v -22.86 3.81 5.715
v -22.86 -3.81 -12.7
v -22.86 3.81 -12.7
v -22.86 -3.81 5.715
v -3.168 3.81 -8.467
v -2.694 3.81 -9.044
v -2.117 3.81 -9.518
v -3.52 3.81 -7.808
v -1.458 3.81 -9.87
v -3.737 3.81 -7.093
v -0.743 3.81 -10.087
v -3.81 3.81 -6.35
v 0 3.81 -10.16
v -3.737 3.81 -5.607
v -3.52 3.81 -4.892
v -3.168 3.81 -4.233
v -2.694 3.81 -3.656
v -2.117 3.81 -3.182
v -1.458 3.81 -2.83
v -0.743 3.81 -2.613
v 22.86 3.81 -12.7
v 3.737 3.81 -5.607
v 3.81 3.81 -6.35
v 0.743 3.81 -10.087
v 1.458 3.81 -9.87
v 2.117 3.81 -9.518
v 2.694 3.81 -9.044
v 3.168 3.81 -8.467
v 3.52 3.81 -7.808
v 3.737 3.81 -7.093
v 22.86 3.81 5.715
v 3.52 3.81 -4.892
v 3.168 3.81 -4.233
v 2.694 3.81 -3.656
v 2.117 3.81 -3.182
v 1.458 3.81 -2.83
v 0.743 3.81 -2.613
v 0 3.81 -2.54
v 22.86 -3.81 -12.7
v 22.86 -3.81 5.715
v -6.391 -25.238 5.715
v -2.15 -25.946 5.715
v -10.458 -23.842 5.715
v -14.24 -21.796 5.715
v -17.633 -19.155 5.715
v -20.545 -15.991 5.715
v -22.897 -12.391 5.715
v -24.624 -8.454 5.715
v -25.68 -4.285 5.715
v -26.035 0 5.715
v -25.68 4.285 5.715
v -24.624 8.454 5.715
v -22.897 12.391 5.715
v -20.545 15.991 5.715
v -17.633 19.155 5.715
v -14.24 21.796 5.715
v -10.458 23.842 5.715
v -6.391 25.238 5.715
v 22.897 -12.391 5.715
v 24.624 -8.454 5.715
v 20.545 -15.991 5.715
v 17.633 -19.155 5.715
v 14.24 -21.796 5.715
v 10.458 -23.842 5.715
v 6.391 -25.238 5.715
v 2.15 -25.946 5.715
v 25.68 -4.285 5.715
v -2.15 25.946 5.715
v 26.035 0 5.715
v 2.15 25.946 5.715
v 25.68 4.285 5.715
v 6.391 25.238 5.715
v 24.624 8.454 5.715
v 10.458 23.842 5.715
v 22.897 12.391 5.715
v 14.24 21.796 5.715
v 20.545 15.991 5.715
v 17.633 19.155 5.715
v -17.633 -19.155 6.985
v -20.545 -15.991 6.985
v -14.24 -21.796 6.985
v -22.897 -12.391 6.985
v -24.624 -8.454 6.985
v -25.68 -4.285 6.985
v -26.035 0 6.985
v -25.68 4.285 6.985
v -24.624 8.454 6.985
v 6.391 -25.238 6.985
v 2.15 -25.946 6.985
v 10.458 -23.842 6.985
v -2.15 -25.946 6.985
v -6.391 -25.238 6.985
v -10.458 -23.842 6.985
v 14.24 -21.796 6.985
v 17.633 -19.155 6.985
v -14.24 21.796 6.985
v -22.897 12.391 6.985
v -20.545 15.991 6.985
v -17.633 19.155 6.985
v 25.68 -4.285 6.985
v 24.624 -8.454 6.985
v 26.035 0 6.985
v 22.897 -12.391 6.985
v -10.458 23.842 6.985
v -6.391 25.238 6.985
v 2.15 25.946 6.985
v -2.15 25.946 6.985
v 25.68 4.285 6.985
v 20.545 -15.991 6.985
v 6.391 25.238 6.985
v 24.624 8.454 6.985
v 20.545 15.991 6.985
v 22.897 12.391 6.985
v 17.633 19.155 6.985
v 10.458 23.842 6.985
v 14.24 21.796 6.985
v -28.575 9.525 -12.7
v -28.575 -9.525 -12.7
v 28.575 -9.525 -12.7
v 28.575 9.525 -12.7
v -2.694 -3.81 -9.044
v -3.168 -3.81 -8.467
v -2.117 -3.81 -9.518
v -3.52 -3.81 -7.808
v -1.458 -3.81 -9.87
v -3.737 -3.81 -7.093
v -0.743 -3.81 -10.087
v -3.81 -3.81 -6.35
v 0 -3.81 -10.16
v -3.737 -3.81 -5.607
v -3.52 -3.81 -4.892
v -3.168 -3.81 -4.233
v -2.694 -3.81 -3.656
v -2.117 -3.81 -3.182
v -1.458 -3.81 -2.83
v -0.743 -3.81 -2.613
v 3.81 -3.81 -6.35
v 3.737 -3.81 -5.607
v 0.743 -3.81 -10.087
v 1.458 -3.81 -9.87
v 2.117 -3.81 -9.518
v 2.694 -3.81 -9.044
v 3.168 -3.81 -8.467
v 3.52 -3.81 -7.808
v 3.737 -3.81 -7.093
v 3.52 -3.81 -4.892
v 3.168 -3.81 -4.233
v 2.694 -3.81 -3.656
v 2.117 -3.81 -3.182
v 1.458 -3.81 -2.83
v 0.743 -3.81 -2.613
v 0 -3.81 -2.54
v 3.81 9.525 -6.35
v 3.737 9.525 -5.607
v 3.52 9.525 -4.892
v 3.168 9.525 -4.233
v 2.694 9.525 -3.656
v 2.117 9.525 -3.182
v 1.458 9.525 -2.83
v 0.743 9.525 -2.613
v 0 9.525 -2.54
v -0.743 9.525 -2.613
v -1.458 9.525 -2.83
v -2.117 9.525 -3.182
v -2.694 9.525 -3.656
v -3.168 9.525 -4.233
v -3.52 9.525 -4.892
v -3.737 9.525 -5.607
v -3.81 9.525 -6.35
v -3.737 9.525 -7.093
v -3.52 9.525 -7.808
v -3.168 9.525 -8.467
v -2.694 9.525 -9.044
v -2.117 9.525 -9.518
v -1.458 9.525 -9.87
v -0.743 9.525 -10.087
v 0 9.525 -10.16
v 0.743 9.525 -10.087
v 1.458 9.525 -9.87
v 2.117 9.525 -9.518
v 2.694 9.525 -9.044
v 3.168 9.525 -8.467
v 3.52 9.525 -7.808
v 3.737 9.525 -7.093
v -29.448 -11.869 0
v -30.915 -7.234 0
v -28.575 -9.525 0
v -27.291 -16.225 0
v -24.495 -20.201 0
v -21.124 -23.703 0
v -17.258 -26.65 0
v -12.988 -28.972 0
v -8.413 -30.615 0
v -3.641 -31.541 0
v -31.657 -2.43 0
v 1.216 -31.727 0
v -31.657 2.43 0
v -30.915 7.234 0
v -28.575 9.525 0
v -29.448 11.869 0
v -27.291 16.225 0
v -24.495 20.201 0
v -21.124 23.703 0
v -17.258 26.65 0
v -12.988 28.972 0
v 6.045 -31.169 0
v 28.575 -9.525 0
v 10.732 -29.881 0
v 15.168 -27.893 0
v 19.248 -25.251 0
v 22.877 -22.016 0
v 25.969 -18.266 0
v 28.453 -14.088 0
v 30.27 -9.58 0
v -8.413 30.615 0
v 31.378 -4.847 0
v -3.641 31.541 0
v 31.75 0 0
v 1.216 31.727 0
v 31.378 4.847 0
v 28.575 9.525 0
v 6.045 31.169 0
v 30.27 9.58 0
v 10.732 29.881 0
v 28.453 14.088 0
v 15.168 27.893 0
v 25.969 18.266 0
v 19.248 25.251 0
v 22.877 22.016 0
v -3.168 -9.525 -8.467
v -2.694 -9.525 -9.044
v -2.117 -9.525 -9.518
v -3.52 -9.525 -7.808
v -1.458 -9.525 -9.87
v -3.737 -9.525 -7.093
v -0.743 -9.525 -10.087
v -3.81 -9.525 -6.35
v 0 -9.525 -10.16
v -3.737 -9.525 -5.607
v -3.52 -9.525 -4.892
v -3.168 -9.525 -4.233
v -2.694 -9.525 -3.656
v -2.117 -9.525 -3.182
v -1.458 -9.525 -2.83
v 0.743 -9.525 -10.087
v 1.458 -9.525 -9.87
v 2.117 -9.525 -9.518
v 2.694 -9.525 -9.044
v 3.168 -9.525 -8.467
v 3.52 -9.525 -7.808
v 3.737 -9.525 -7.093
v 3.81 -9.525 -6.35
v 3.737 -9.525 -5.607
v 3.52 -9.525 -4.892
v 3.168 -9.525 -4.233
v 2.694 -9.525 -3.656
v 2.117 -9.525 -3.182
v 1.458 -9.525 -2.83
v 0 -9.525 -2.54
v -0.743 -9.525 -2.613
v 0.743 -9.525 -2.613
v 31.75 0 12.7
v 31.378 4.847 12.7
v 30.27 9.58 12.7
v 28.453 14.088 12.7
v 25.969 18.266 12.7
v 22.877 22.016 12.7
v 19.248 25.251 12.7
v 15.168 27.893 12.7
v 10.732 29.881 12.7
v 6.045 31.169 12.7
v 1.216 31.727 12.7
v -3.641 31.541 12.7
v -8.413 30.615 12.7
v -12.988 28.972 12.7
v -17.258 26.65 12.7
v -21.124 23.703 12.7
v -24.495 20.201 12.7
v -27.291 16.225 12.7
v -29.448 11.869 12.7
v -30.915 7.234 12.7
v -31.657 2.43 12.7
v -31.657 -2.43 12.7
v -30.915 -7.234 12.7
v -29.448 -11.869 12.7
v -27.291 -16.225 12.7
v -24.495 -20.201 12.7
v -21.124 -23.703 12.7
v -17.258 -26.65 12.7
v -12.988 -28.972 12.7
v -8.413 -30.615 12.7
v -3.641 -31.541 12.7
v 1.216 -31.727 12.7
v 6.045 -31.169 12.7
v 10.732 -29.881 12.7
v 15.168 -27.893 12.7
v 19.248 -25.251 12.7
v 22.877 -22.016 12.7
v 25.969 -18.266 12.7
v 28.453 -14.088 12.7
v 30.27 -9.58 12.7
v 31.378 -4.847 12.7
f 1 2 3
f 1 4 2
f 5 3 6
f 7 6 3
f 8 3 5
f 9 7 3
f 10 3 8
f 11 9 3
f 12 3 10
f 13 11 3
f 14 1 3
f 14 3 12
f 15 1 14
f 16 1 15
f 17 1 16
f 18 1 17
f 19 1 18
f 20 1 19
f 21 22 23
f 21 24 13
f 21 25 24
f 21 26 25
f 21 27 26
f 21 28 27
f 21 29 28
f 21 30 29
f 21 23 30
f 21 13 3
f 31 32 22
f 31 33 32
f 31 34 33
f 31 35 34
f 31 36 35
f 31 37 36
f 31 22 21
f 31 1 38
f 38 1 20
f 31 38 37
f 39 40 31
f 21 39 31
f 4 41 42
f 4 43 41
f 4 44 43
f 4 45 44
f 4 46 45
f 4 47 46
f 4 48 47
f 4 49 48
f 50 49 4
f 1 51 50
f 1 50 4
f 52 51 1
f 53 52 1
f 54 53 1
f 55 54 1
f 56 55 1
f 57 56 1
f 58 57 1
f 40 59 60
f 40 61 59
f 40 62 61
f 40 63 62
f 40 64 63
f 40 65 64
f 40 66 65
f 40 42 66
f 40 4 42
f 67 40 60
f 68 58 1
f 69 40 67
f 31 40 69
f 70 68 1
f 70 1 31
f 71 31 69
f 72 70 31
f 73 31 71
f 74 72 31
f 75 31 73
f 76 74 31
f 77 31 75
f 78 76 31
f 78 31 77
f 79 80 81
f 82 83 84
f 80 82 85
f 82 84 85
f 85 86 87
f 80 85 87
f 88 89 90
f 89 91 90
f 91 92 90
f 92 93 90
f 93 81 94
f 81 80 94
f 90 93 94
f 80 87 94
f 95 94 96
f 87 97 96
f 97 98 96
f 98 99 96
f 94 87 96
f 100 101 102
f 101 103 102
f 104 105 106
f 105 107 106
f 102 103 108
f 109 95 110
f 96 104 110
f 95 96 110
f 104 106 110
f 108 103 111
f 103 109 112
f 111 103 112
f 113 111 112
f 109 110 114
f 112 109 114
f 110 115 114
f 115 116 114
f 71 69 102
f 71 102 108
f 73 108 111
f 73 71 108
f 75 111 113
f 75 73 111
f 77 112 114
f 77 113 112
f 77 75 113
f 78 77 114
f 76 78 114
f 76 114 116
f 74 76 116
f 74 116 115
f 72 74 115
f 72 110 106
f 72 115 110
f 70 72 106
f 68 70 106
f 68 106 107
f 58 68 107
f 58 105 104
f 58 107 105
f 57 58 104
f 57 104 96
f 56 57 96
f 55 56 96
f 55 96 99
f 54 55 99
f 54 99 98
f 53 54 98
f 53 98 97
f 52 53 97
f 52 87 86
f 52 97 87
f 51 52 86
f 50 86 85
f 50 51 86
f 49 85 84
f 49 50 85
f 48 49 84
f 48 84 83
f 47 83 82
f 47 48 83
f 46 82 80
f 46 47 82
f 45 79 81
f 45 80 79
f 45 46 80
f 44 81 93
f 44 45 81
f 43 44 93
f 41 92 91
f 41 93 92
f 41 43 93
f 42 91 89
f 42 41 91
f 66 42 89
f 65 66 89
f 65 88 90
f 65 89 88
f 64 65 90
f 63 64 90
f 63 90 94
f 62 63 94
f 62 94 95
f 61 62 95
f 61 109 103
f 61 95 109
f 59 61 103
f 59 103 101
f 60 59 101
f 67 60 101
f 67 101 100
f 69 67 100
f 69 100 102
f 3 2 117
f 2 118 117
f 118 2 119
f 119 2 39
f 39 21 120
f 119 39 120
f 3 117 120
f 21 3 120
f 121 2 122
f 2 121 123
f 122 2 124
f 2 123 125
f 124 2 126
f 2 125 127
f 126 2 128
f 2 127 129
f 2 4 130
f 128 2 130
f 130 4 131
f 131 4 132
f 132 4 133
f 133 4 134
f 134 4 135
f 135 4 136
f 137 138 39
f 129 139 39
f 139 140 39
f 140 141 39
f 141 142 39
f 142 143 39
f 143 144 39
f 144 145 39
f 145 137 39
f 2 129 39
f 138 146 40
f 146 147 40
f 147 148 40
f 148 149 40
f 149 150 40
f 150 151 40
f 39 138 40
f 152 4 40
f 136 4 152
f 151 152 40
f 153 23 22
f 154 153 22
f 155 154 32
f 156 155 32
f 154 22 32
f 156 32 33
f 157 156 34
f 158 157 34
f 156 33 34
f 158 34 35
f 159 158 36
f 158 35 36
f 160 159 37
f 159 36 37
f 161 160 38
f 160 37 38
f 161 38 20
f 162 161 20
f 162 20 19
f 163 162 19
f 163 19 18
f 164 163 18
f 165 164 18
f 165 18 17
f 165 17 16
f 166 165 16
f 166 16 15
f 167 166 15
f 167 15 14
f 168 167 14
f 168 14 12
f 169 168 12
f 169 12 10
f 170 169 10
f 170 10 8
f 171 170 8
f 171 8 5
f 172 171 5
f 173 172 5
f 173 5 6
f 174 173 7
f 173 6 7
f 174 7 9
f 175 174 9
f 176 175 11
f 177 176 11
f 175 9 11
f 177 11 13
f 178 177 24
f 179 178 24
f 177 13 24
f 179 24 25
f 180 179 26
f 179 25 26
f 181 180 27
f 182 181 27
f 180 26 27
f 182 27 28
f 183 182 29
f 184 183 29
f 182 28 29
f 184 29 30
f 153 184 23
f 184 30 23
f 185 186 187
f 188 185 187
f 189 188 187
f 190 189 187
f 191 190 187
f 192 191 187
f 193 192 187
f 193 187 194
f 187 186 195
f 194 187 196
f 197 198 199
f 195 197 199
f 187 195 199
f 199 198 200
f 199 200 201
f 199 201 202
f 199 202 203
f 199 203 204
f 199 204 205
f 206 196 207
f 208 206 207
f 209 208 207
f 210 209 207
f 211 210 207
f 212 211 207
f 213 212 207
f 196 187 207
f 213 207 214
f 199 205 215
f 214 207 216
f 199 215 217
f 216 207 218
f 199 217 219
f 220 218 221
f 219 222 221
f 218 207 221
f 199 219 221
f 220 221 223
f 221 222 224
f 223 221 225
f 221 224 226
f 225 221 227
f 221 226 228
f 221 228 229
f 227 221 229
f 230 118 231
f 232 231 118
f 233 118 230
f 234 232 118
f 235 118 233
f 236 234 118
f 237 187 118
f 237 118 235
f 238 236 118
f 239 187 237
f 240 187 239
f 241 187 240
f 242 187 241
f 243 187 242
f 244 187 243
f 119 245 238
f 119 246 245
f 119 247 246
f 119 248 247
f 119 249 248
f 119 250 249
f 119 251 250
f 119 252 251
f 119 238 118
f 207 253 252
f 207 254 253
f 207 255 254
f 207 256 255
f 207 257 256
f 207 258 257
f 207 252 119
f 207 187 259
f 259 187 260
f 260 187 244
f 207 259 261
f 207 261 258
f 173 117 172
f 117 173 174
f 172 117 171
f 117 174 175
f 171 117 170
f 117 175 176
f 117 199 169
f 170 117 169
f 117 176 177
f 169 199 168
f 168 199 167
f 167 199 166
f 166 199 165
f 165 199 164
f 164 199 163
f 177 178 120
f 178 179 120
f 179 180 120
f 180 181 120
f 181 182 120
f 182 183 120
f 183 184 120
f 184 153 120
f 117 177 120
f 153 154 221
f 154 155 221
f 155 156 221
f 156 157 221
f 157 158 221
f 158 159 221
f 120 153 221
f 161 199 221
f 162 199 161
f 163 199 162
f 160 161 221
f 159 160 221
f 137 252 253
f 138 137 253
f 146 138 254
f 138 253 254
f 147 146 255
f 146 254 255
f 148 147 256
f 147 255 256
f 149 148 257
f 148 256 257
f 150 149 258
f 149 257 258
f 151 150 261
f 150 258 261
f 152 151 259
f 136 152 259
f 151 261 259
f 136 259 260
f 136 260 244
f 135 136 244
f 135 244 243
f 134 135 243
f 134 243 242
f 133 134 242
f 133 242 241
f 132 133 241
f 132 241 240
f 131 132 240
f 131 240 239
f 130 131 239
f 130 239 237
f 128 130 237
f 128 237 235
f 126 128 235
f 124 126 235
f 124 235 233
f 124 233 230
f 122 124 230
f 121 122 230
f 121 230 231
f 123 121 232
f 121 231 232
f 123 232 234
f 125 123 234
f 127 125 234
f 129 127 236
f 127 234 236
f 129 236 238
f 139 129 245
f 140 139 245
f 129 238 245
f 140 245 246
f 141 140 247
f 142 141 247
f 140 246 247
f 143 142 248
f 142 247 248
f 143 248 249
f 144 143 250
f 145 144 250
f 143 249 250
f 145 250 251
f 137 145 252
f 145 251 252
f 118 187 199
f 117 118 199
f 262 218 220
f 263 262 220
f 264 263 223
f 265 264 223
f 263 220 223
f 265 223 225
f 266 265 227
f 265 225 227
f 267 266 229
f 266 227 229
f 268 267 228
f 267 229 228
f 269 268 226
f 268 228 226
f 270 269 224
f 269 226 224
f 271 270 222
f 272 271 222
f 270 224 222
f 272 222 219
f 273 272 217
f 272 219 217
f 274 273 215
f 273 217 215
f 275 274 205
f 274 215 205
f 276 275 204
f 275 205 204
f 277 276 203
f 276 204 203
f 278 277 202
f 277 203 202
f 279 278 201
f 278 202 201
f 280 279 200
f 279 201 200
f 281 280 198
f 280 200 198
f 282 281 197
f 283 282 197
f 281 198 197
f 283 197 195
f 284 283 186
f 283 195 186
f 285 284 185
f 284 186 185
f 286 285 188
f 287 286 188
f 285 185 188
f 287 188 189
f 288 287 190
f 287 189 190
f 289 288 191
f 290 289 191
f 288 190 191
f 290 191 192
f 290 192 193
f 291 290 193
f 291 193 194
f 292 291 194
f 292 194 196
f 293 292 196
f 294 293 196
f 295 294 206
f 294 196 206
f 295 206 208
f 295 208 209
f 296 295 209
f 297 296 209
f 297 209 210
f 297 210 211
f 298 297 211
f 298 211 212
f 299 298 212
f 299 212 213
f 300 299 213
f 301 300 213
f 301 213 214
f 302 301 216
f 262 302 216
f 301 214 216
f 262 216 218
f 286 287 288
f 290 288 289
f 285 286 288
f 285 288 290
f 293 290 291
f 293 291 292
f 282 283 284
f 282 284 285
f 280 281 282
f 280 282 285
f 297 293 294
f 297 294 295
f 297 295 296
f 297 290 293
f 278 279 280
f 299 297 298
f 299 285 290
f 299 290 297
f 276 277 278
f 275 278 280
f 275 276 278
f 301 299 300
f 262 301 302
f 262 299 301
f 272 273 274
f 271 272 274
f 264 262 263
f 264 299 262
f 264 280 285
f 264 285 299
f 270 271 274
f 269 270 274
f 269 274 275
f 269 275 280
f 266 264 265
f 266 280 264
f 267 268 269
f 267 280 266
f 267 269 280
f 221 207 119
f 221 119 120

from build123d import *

# Parameters (mm, degrees)
F0_R     = 31.75
F1_DEPTH = 12.7
F2_W     = 57.15
F2_H     = 19.05
F3_DEPTH = 12.7
F4_T     = -5.715
F5_R     = 3.81
F6_DEPTH = 41.276


with BuildPart() as f1:
    # F0 (on Top) → F1 (new body)
    with BuildSketch(Plane.XY):
        Circle(F0_R)
    extrude(amount=F1_DEPTH)

    # F2 (on Top) → F3 (join)
    with BuildSketch(Plane.XY):
        Rectangle(F2_W, F2_H)
    extrude(amount=-F3_DEPTH)

    # F4
    f4_openings = [f1.faces().sort_by_distance(p)[0] for p in [
        (0, 0, -12.7),
    ]]
    offset(amount=F4_T, openings=f4_openings, kind=Kind.INTERSECTION)

    # F5 (on face) → F6 (cut, through all)
    with BuildSketch(Plane.XZ.offset(9.525)):
        with Locations((0, -6.35)):
            Circle(F5_R)
    extrude(amount=-F6_DEPTH, mode=Mode.SUBTRACT)


solid = f1.part
